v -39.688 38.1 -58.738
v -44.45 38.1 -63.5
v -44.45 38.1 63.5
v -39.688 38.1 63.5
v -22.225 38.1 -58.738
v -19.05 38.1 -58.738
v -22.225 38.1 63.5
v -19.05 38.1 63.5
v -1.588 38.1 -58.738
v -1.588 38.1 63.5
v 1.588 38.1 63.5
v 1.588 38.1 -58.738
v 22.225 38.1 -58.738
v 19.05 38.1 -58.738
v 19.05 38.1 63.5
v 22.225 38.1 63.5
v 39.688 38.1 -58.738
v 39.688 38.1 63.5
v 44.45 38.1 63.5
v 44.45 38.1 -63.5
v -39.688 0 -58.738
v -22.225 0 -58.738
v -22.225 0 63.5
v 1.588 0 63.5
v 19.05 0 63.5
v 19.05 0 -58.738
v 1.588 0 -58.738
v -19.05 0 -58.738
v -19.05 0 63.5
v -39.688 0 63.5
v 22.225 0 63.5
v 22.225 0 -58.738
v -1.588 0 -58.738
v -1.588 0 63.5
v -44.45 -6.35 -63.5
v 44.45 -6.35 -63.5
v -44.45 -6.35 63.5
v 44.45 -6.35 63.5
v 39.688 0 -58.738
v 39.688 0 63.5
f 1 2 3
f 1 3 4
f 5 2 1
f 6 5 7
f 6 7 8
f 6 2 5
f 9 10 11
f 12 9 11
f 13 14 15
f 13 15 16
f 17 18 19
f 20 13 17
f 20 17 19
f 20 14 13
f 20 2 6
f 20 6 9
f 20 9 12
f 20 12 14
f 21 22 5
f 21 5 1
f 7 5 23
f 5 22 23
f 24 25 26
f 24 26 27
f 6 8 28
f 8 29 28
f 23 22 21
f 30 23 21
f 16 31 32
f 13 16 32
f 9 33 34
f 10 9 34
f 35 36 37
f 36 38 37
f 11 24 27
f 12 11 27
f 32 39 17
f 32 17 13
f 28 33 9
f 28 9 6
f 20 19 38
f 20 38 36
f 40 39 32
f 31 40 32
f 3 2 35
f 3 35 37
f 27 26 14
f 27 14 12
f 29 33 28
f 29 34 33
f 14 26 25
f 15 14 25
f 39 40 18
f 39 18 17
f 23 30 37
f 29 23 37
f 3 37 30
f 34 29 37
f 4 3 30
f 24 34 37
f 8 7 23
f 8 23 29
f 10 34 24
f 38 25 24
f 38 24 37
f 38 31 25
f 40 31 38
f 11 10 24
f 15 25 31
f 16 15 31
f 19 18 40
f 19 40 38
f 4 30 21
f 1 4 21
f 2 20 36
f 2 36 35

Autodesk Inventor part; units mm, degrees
ref_plane "YZ Plane" through (0, 0, 0) normal (1, 0, 0) x (0, 1, 0)
ref_plane "XZ Plane" through (0, 0, 0) normal (0, 1, 0) x (-1, 0, 0)
ref_plane "XY Plane" through (0, 0, 0) normal (0, 0, 1) x (1, 0, 0)
sketch "Sketch2" plane through (0, 0, 0) normal (0, 1, 0) x (-1, 0, 0)
  line L0 (44.45, 63.5) -> (-44.45, 63.5)
  line L1 (-44.45, 63.5) -> (-44.45, -63.5)
  line L2 (-44.45, -63.5) -> (44.45, -63.5)
  line L3 (44.45, -63.5) -> (44.45, 63.5)
  line L4 (44.45, 63.5) -> (-44.45, -63.5) construction
  line L5 (-44.45, 63.5) -> (44.45, -63.5) construction
  point P0 (0, 0)
  dimension "d0" = 127
  dimension "d1" = 88.9
extrude "Extrusion1" add sketch "Sketch2" against normal blind 6.35
sketch "Sketch4" plane through (0, 0, 0) normal (0, 1, 0) x (1, 0, 0)
  line L0 (-44.45, -63.5) -> (-44.45, 63.5) projected
  line L1 (44.45, 63.5) -> (44.45, -63.5) projected
  line L2 (-44.45, 63.5) -> (44.45, 63.5)
  line L3 (44.45, 63.5) -> (44.45, 58.7375)
  line L4 (44.45, 58.7375) -> (-44.45, 58.7375)
  line L5 (-44.45, 58.7375) -> (-44.45, 63.5)
  point P0 (0, 0)
  point P1 (-44.45, 58.7375)
  dimension "d4" = 4.7625
extrude "Extrusion2" add sketch "Sketch4" along normal blind 38.1
sketch "Sketch5" plane through (0, 0, 0) normal (0, 1, 0) x (1, 0, 0)
  line L0 (44.45, -63.5) -> (-44.45, -63.5) projected
  line L1 (-44.45, 58.7375) -> (44.45, 58.7375) projected
  line L2 (-44.45, -63.5) -> (-39.6875, -63.5)
  line L3 (-39.6875, -63.5) -> (-39.6875, 58.7375)
  line L4 (-44.45, 58.7375) -> (-44.45, -63.5)
  line L5 (44.45, 63.5) -> (44.45, -63.5) projected
  line L6 (44.45, -63.5) -> (39.6875, -63.5)
  line L7 (39.6875, -63.5) -> (39.6875, 58.7375)
  line L8 (44.45, 58.7375) -> (44.45, -63.5)
  line L9 (-44.45, 58.7375) -> (-44.45, -63.5) projected
  line L10 (-44.45, -63.5) -> (-44.45, 63.5) projected
  line L11 (-44.45, 58.7375) -> (-44.45, 63.5)
  line L12 (-44.45, 63.5) -> (-39.6875, 63.5)
  line L13 (-44.45, 63.5) -> (44.45, 63.5) projected
  line L14 (-39.6875, 58.7375) -> (-39.6875, 63.5)
  line L15 (44.45, 58.7375) -> (-44.45, 58.7375) projected
  line L16 (44.45, 58.7375) -> (44.45, 63.5)
  line L17 (39.6875, 63.5) -> (39.6875, 58.7375)
  point P0 (0, 0)
  point P1 (39.6875, -63.5)
  point P2 (-44.45, 58.7375)
  dimension "d7" = 4.7625
  dimension "d8" = 4.7625
extrude "Extrusion3" add sketch "Sketch5" along normal blind 38.1 contours L0 L7 L1 L5 | L1 L17 L13 L5 | L0 L4 L1 L3 | L1 L10 L12 L14
sketch "Sketch6" plane through (0, 0, 0) normal (0, 1, 0) x (1, 0, 0)
  line L0 (-39.6875, -63.5) -> (39.6875, -63.5) projected
  line L1 (-39.6875, 58.7375) -> (39.6875, 58.7375) projected
  line L2 (-22.225, -63.5) -> (-19.05, -63.5)
  line L3 (-19.05, -63.5) -> (-19.05, 58.7375)
  line L4 (-19.05, 58.7375) -> (-22.225, 58.7375)
  line L5 (-22.225, 58.7375) -> (-22.225, -63.5)
  line L6 (-1.5875, -63.5) -> (1.5875, -63.5)
  line L7 (1.5875, -63.5) -> (1.5875, 58.7375)
  line L8 (1.5875, 58.7375) -> (-1.5875, 58.7375)
  line L9 (-1.5875, 58.7375) -> (-1.5875, -63.5)
  line L10 (19.05, -63.5) -> (22.225, -63.5)
  line L11 (22.225, -63.5) -> (22.225, 58.7375)
  line L12 (22.225, 58.7375) -> (19.05, 58.7375)
  line L13 (19.05, 58.7375) -> (19.05, -63.5)
  line L14 (-39.6875, -63.5) -> (-39.6875, 58.7375) projected
  line L15 (39.6875, 58.7375) -> (39.6875, -63.5) projected
  point P0 (0, 0)
  point P1 (19.05, -63.5)
  point P2 (22.225, -63.5)
  point P3 (22.225, 58.7375)
  point P4 (-1.5875, 58.7375)
  point P5 (-1.5875, -63.5)
  dimension "d11" = 3.175
  dimension "d12" = 3.175
  dimension "d13" = 3.175
  dimension "d14" = 17.4625
  dimension "d15" = 17.4625
  dimension "d16" = 17.4625
  dimension "d17" = 17.4625
extrude "Extrusion4" add sketch "Sketch6" along normal blind 38.1 contours L5 L1 L3 L0 | L9 L1 L7 L0 | L13 L1 L11 L0
sketch "Sketch7" plane through (-39.6875, 0, -58.7375) normal (0, 0, 1) x (1, 0, 0)
  line L0 (0, 76.2) -> (0, 0) construction
  line L1 (0, 38.1) -> (79.375, 38.1) construction
  line L2 (79.375, 0) -> (79.375, 76.2) construction
  line L3 (39.6875, 38.1) -> (39.6875, 38.1) construction
  line L4 (84.1375, 38.1) -> (-4.7625, 38.1) construction
  point P0 (39.6875, 0)
  point P1 (8.7313, 38.1)
  point P2 (84.1375, 25.4)
  point P3 (-4.7625, 25.4)
  point P4 (8.7312, 38.1)
  dimension "d18" = 8.7312
equation "\"d0\" = depth"
equation "\"d1\" = width"
equation "\"d2\" = baseThickness"
equation "\"d4\" = backThickness"
equation "\"d5\" = backHeight"
equation "\"d7\" = edgeThickness"
equation "\"d8\" = edgeThickness"
equation "\"d9\" = edgeHeight"
equation "\"d11\" = dividerThickness"
equation "\"d12\" = dividerThickness"
equation "\"d13\" = dividerThickness"
equation "\"d14\" = dividerGap"
equation "\"d15\" = dividerGap"
equation "\"d16\" = dividerGap"
equation "\"d19\" = dividerHeight"
equation "\"d18\" = 0.5 * dividerGap"
equation "\"baseThickness\" = 6.35"
equation "\"width\" = 88.9"
equation "\"depth\" = 127"
equation "\"backHeight\" = 38.1"
equation "\"backThickness\" = 4.7625"
equation "\"edgeThickness\" = 4.7625"
equation "\"edgeHeight\" = 38.1"
equation "\"dividerThickness\" = 3.175"
equation "\"dividerHeight\" = 38.1"
equation "\"dividerGap\" = 17.4625"
properties part number "shelfForElectronics"
